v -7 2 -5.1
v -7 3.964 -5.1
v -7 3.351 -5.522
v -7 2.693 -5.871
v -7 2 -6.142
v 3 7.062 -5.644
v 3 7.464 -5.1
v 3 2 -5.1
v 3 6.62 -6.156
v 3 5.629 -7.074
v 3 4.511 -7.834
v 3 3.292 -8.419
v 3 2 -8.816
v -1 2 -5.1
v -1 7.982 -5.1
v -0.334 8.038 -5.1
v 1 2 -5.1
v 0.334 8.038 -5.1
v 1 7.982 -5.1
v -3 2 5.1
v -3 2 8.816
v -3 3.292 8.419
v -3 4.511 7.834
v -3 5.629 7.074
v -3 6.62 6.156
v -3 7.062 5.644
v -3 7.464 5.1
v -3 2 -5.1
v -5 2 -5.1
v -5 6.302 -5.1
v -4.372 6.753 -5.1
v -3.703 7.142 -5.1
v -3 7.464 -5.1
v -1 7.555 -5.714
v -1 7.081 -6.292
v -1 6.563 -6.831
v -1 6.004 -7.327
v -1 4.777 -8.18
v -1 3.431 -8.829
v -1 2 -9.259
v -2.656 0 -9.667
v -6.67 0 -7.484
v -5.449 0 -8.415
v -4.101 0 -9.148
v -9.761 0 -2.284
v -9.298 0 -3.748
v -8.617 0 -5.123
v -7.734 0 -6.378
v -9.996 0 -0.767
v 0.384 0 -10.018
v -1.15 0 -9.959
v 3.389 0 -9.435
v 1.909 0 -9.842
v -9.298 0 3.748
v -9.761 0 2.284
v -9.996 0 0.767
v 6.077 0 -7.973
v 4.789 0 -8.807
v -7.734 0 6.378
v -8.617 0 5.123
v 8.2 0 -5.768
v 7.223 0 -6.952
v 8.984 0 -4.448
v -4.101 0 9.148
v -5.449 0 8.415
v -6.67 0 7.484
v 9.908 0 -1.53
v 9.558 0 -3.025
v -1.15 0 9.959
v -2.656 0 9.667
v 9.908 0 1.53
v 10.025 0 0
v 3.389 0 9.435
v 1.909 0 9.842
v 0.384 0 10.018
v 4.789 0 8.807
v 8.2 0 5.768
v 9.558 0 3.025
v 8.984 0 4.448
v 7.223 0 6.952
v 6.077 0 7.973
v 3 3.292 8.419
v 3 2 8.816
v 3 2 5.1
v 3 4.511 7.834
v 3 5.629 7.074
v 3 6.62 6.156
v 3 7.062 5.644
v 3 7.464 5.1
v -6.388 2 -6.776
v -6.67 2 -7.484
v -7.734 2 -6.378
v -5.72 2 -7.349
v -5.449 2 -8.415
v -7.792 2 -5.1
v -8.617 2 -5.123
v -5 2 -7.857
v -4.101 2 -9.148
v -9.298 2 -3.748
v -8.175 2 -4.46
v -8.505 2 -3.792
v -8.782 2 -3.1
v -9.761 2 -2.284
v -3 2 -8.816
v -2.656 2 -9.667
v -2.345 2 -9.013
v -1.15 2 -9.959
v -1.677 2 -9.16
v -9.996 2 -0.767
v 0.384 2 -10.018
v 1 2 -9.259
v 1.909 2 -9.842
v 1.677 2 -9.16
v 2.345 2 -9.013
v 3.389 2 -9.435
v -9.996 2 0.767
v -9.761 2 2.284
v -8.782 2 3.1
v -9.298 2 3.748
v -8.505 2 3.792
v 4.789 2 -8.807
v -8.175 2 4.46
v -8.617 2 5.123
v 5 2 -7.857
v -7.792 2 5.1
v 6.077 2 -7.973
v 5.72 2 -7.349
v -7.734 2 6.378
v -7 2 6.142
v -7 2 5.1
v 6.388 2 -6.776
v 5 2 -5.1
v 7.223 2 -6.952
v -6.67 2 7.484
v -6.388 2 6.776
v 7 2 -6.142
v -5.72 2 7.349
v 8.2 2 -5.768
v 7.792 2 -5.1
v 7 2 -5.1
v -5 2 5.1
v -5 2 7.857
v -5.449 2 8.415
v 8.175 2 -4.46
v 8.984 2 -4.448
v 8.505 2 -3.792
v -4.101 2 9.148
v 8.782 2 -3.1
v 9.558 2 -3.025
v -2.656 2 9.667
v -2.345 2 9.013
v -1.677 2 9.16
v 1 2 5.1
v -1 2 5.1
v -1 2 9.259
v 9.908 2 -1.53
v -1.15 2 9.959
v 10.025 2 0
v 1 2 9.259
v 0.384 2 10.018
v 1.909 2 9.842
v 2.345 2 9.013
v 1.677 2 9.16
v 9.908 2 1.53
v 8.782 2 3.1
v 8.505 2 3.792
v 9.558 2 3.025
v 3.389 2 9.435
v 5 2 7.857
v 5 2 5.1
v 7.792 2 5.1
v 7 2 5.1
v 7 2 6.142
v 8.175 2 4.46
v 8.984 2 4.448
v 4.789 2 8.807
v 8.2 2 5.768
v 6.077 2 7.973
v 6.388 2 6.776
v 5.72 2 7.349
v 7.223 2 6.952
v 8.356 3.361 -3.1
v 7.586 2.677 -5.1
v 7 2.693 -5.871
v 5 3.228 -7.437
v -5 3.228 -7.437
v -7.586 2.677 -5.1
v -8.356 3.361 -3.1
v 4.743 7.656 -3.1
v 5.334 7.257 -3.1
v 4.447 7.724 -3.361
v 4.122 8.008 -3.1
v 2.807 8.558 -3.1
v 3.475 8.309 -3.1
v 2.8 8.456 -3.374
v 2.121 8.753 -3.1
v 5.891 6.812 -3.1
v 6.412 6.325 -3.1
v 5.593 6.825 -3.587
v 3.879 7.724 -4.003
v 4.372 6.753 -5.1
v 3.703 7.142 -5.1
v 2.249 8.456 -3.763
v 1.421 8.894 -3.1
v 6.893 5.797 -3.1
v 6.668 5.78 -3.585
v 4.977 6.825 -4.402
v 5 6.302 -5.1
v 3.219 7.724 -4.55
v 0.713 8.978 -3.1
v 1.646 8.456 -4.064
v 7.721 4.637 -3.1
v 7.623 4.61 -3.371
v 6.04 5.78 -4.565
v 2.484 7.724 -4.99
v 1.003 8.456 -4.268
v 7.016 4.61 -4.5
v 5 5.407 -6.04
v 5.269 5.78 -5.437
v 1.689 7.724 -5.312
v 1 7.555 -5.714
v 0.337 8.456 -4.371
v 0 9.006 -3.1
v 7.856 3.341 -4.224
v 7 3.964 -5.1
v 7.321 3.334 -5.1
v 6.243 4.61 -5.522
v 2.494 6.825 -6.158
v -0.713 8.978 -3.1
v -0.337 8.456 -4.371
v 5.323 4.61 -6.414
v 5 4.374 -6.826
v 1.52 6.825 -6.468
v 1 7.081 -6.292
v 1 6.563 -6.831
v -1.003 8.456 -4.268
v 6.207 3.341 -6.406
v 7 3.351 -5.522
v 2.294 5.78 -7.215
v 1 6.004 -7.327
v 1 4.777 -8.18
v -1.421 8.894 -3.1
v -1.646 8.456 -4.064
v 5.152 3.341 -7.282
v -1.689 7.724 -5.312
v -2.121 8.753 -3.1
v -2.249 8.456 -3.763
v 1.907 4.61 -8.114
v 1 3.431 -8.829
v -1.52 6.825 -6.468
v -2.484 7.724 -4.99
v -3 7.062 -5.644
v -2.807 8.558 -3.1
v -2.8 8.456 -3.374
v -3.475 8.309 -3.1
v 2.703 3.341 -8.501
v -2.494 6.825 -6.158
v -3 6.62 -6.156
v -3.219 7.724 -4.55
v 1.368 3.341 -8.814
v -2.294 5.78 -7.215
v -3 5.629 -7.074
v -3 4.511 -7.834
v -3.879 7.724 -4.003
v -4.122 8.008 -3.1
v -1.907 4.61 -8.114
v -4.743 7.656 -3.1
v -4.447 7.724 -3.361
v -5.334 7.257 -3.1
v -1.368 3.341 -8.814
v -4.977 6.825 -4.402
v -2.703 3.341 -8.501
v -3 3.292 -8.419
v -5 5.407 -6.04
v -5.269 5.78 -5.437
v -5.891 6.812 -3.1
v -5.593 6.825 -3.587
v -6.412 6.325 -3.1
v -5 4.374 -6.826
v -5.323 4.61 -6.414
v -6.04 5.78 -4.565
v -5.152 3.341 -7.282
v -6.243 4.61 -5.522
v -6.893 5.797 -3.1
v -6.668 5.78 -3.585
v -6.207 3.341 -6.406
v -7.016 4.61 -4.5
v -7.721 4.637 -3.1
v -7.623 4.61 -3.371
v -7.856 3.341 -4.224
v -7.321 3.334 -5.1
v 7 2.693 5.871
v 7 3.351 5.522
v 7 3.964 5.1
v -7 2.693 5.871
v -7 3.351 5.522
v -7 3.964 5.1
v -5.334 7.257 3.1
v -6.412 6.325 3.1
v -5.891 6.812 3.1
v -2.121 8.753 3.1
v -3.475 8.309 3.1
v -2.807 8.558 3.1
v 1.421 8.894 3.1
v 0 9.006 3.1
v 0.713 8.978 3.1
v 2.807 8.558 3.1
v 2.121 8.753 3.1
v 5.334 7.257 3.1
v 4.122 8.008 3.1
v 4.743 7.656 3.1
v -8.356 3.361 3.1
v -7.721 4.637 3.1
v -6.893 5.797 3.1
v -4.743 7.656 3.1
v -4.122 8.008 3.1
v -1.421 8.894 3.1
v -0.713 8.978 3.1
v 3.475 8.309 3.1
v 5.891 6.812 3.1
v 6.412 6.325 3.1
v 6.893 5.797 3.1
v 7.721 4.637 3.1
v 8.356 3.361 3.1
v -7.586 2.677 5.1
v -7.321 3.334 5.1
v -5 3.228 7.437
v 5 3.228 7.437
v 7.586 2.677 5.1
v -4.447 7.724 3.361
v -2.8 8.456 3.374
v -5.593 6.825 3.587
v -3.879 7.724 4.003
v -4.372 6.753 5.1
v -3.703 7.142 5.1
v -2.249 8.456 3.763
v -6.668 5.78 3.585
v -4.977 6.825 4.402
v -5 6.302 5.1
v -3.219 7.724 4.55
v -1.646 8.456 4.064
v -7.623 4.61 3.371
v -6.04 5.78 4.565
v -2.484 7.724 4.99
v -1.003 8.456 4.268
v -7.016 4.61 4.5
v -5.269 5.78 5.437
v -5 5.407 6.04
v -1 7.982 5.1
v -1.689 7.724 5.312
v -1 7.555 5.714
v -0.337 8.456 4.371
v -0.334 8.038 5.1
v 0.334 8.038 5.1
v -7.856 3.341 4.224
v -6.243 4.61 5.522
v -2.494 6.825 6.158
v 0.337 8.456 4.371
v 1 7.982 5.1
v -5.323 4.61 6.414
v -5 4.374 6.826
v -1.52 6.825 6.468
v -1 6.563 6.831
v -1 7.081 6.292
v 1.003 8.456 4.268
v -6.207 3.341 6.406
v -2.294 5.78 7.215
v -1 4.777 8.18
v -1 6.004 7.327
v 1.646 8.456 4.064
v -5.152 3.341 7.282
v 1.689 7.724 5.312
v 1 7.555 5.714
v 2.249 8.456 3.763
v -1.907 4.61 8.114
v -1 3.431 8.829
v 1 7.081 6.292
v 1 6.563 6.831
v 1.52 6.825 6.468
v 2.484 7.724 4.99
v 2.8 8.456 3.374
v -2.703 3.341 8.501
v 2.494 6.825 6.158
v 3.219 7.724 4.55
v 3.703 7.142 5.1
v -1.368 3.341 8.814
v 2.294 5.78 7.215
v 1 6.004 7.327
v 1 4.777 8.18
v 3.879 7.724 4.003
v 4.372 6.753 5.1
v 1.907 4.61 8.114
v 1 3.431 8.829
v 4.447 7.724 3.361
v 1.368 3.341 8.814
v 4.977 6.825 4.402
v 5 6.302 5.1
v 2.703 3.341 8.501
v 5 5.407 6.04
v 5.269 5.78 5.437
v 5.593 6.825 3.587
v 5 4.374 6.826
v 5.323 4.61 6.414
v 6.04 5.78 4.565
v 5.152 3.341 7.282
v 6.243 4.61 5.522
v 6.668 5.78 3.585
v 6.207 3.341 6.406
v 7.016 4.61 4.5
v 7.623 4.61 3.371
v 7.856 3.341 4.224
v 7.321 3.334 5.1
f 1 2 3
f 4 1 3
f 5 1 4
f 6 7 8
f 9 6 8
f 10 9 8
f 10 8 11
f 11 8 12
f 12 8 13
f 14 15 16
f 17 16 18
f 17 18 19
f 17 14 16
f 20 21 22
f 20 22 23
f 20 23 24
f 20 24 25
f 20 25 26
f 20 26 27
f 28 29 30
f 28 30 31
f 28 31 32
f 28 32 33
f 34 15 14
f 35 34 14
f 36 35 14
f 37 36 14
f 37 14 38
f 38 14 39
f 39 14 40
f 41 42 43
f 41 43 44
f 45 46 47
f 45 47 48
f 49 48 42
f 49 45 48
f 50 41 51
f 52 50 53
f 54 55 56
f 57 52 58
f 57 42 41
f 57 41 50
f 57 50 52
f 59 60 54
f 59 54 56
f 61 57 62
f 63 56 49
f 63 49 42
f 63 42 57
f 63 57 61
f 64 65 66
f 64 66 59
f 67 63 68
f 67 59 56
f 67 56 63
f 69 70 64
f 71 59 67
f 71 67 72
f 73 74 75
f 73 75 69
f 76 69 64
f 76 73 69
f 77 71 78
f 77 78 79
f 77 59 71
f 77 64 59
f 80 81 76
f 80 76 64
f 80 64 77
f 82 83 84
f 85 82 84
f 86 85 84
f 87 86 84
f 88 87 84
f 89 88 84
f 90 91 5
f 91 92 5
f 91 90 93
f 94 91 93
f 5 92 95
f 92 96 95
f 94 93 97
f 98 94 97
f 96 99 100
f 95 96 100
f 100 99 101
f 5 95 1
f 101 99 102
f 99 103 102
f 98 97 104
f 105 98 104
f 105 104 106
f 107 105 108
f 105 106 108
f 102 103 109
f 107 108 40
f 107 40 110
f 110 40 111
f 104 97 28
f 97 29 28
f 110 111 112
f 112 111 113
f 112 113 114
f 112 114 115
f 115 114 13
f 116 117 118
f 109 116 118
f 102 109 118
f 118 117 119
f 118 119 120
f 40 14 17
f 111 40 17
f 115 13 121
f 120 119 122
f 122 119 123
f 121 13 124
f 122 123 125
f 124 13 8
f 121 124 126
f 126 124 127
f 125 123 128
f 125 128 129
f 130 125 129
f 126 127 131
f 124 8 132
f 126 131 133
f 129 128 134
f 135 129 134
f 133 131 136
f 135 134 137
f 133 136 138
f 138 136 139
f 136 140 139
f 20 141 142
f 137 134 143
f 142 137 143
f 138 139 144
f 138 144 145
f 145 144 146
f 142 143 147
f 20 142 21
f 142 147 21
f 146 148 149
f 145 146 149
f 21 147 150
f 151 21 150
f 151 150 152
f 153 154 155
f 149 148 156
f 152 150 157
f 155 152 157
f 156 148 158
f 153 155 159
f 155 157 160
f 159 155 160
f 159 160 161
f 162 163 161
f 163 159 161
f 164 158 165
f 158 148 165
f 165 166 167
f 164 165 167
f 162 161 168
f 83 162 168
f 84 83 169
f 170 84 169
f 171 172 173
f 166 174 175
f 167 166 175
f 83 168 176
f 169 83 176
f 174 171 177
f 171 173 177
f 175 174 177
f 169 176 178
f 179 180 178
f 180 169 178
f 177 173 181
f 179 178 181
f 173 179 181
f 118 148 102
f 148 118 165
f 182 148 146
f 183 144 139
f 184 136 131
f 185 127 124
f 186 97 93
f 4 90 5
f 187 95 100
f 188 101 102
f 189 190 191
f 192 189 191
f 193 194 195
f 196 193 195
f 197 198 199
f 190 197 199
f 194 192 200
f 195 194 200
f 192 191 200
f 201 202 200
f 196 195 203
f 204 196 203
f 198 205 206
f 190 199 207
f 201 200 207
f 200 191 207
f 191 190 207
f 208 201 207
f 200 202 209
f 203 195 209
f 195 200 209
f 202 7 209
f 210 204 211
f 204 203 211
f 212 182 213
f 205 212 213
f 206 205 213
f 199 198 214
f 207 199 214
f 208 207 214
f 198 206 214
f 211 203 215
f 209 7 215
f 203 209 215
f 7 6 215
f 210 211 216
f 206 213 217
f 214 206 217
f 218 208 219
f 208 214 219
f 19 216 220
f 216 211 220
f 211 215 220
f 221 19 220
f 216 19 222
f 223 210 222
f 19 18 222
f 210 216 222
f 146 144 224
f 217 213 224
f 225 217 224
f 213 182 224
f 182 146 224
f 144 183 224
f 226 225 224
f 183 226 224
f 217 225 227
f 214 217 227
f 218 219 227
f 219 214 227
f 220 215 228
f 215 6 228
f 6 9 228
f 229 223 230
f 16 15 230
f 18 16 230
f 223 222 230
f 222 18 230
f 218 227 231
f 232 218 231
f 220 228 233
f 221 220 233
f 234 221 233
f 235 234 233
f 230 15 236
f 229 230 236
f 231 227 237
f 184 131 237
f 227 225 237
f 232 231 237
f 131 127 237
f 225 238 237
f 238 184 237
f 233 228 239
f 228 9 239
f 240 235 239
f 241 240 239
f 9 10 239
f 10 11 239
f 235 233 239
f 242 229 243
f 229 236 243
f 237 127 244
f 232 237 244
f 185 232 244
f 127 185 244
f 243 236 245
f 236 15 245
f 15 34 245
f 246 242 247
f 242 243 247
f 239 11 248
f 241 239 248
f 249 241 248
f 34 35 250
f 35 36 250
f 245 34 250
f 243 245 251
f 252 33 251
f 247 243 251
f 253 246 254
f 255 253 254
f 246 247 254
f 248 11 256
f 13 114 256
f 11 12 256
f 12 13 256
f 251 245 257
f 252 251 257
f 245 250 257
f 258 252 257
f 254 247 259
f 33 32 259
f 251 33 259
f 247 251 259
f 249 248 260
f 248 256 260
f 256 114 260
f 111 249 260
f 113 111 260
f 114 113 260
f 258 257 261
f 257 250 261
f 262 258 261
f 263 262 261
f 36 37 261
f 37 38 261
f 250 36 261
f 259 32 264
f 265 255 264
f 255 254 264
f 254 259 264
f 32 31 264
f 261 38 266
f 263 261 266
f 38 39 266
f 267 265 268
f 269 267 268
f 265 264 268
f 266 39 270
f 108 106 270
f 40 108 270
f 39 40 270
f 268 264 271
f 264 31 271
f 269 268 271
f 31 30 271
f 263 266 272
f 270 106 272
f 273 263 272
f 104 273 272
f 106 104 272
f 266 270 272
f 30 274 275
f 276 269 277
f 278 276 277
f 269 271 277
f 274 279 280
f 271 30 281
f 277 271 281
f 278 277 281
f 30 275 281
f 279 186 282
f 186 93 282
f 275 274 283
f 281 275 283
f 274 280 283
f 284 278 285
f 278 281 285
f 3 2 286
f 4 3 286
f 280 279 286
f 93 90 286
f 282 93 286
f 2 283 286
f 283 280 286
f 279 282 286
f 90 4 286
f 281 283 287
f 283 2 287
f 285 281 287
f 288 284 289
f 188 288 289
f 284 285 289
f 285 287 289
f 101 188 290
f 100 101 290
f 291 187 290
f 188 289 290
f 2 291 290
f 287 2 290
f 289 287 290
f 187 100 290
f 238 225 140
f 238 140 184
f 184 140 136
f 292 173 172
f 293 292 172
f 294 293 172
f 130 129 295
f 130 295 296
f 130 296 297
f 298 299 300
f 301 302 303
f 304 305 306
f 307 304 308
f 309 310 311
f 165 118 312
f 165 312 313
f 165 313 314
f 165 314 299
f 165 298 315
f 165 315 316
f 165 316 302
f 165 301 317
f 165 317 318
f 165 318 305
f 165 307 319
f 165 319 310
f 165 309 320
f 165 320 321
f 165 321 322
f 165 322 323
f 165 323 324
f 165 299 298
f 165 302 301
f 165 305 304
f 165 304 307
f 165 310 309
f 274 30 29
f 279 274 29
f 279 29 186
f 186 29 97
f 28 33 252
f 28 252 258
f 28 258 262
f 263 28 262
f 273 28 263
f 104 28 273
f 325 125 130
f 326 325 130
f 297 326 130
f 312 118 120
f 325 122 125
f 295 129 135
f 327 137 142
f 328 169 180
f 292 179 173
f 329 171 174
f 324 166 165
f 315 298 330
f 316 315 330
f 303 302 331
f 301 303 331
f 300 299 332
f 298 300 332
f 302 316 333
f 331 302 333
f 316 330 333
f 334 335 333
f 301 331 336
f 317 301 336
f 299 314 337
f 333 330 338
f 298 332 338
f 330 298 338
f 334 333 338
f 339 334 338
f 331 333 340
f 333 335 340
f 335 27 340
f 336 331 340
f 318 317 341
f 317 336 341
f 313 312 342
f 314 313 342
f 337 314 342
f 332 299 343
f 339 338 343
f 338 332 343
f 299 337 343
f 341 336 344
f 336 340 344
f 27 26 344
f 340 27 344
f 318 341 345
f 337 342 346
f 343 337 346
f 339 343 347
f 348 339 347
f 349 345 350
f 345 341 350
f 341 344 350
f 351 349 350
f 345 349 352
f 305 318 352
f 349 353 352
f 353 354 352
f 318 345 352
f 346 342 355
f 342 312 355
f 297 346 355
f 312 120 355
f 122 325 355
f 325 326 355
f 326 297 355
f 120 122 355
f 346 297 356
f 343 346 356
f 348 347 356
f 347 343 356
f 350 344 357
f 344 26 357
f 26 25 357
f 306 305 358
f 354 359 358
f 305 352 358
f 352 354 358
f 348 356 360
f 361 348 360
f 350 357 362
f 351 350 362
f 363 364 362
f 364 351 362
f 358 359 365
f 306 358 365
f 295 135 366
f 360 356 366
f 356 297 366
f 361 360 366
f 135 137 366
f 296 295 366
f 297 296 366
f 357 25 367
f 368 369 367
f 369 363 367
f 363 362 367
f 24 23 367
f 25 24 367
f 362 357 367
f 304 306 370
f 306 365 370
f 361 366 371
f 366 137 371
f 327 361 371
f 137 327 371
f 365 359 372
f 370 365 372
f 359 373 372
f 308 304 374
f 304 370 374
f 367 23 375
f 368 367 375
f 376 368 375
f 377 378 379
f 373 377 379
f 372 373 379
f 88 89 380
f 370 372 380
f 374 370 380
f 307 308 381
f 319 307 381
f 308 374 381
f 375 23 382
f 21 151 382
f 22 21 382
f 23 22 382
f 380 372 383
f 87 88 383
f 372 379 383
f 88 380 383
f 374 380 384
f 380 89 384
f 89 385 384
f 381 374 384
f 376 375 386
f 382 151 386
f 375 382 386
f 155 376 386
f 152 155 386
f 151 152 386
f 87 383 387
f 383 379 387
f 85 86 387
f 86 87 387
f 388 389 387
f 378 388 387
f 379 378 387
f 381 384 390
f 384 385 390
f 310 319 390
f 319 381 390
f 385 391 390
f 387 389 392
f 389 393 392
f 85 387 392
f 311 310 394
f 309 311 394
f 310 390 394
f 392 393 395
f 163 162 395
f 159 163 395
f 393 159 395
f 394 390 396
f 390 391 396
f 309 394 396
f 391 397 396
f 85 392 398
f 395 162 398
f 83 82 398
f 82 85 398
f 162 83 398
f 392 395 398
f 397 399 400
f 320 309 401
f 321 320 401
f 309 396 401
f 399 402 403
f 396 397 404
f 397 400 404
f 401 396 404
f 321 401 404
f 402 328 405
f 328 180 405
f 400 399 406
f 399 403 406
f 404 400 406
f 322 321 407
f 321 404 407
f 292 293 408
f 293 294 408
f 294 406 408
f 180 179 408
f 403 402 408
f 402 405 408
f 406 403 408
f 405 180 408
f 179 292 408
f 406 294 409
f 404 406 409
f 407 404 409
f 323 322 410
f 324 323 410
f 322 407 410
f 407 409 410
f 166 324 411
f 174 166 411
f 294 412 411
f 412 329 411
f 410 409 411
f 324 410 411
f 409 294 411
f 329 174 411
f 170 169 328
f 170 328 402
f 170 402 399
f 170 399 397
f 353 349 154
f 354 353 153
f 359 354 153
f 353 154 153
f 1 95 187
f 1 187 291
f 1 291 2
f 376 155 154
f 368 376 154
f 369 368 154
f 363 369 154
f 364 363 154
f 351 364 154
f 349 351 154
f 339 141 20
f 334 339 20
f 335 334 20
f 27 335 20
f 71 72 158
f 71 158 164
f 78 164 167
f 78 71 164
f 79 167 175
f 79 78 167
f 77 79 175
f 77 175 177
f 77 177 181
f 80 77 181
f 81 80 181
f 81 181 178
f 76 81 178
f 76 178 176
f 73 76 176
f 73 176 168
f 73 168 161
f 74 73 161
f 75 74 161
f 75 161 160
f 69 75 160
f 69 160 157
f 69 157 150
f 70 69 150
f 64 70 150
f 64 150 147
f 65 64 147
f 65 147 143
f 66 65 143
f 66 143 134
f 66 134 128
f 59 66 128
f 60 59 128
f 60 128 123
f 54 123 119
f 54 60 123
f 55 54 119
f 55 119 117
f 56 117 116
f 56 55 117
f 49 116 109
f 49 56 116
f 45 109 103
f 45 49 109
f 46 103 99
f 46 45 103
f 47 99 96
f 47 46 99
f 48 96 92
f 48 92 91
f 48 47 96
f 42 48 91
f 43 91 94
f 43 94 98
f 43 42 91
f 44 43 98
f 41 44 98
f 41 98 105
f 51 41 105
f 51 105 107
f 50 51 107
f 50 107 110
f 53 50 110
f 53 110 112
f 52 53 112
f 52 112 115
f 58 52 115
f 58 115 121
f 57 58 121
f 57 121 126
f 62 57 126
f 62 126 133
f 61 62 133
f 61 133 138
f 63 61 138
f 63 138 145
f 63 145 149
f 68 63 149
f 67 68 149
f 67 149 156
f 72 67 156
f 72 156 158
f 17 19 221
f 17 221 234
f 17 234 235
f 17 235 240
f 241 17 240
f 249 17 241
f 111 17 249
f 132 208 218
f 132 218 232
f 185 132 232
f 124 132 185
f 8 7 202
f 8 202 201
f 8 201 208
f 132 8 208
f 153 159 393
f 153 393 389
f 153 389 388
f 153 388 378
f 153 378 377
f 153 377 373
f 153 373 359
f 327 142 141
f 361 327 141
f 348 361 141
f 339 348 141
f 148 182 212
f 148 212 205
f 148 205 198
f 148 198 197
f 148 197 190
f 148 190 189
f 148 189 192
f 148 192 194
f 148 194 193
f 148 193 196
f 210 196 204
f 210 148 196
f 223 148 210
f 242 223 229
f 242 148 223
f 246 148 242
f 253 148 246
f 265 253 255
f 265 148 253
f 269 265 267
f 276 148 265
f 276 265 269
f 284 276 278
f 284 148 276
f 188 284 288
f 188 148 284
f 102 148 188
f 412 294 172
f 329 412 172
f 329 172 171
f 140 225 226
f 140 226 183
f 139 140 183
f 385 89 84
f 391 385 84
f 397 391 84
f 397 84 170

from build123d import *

# Parameters (mm, degrees)
SKETCH2_R           = 10.025
BOSS_EXTRUDE1_DEPTH = 2
SKETCH3_W           = 2
SKETCH3_H           = 15.533622691
CUT_EXTRUDE1_DEPTH  = 8.525


with BuildPart() as part:
    # Sketch1 → Revolve1 (revolve)
    with BuildSketch(Plane.XY):
        with BuildLine():
            Line((9.525, 0), (0, 0))
            Line((0, 0), (0, 9.525))
            ThreePointArc((0, 9.525), (6.735192091, 6.735192091), (9.525, 0))
        make_face()
    revolve(axis=Axis((0, 0, 0), (0, 1, 0)))

    # Sketch2 → Boss-Extrude1 (add)
    with BuildSketch(Plane.XZ):
        Circle(SKETCH2_R)
    extrude(amount=-BOSS_EXTRUDE1_DEPTH)

    # Sketch3 → Cut-Extrude1 (cut, through all)
    with BuildSketch(Plane(origin=(0, 2, 0), x_dir=(1, 0, 0), z_dir=(0, 1, 0))):
        Polygon((-9.533657483, -3.1), (9.533657483, -3.1), (10.025, -3.1), (10.025, 3.1), (9.533657483, 3.1), (-9.533657483, 3.1), (-10.025, 3.1), (-10.025, -3.1), align=None)
        with Locations((0, -12.866811346)):
            Rectangle(SKETCH3_W, SKETCH3_H)
        with Locations((0, 12.866811346)):
            Rectangle(SKETCH3_W, SKETCH3_H)
        with Locations((4, -12.866811346)):
            Rectangle(SKETCH3_W, SKETCH3_H)
        with Locations((4, 12.866811346)):
            Rectangle(SKETCH3_W, SKETCH3_H)
        with Locations((8, -12.866811346)):
            Rectangle(SKETCH3_W, SKETCH3_H)
        with Locations((8, 12.866811346)):
            Rectangle(SKETCH3_W, SKETCH3_H)
        with Locations((12, -12.866811346)):
            Rectangle(SKETCH3_W, SKETCH3_H)
        with Locations((12, 12.866811346)):
            Rectangle(SKETCH3_W, SKETCH3_H)
        with Locations((16, -12.866811346)):
            Rectangle(SKETCH3_W, SKETCH3_H)
        with Locations((16, 12.866811346)):
            Rectangle(SKETCH3_W, SKETCH3_H)
        with Locations((-4, 12.866811346)):
            Rectangle(SKETCH3_W, SKETCH3_H)
        with Locations((-4, -12.866811346)):
            Rectangle(SKETCH3_W, SKETCH3_H)
        with Locations((-8, 12.866811346)):
            Rectangle(SKETCH3_W, SKETCH3_H)
        with Locations((-8, -12.866811346)):
            Rectangle(SKETCH3_W, SKETCH3_H)
        with Locations((-12, 12.866811346)):
            Rectangle(SKETCH3_W, SKETCH3_H)
        with Locations((-12, -12.866811346)):
            Rectangle(SKETCH3_W, SKETCH3_H)
        with Locations((-16, 12.866811346)):
            Rectangle(SKETCH3_W, SKETCH3_H)
        with Locations((-16, -12.866811346)):
            Rectangle(SKETCH3_W, SKETCH3_H)
    extrude(amount=CUT_EXTRUDE1_DEPTH, mode=Mode.SUBTRACT)


solid = part.part
